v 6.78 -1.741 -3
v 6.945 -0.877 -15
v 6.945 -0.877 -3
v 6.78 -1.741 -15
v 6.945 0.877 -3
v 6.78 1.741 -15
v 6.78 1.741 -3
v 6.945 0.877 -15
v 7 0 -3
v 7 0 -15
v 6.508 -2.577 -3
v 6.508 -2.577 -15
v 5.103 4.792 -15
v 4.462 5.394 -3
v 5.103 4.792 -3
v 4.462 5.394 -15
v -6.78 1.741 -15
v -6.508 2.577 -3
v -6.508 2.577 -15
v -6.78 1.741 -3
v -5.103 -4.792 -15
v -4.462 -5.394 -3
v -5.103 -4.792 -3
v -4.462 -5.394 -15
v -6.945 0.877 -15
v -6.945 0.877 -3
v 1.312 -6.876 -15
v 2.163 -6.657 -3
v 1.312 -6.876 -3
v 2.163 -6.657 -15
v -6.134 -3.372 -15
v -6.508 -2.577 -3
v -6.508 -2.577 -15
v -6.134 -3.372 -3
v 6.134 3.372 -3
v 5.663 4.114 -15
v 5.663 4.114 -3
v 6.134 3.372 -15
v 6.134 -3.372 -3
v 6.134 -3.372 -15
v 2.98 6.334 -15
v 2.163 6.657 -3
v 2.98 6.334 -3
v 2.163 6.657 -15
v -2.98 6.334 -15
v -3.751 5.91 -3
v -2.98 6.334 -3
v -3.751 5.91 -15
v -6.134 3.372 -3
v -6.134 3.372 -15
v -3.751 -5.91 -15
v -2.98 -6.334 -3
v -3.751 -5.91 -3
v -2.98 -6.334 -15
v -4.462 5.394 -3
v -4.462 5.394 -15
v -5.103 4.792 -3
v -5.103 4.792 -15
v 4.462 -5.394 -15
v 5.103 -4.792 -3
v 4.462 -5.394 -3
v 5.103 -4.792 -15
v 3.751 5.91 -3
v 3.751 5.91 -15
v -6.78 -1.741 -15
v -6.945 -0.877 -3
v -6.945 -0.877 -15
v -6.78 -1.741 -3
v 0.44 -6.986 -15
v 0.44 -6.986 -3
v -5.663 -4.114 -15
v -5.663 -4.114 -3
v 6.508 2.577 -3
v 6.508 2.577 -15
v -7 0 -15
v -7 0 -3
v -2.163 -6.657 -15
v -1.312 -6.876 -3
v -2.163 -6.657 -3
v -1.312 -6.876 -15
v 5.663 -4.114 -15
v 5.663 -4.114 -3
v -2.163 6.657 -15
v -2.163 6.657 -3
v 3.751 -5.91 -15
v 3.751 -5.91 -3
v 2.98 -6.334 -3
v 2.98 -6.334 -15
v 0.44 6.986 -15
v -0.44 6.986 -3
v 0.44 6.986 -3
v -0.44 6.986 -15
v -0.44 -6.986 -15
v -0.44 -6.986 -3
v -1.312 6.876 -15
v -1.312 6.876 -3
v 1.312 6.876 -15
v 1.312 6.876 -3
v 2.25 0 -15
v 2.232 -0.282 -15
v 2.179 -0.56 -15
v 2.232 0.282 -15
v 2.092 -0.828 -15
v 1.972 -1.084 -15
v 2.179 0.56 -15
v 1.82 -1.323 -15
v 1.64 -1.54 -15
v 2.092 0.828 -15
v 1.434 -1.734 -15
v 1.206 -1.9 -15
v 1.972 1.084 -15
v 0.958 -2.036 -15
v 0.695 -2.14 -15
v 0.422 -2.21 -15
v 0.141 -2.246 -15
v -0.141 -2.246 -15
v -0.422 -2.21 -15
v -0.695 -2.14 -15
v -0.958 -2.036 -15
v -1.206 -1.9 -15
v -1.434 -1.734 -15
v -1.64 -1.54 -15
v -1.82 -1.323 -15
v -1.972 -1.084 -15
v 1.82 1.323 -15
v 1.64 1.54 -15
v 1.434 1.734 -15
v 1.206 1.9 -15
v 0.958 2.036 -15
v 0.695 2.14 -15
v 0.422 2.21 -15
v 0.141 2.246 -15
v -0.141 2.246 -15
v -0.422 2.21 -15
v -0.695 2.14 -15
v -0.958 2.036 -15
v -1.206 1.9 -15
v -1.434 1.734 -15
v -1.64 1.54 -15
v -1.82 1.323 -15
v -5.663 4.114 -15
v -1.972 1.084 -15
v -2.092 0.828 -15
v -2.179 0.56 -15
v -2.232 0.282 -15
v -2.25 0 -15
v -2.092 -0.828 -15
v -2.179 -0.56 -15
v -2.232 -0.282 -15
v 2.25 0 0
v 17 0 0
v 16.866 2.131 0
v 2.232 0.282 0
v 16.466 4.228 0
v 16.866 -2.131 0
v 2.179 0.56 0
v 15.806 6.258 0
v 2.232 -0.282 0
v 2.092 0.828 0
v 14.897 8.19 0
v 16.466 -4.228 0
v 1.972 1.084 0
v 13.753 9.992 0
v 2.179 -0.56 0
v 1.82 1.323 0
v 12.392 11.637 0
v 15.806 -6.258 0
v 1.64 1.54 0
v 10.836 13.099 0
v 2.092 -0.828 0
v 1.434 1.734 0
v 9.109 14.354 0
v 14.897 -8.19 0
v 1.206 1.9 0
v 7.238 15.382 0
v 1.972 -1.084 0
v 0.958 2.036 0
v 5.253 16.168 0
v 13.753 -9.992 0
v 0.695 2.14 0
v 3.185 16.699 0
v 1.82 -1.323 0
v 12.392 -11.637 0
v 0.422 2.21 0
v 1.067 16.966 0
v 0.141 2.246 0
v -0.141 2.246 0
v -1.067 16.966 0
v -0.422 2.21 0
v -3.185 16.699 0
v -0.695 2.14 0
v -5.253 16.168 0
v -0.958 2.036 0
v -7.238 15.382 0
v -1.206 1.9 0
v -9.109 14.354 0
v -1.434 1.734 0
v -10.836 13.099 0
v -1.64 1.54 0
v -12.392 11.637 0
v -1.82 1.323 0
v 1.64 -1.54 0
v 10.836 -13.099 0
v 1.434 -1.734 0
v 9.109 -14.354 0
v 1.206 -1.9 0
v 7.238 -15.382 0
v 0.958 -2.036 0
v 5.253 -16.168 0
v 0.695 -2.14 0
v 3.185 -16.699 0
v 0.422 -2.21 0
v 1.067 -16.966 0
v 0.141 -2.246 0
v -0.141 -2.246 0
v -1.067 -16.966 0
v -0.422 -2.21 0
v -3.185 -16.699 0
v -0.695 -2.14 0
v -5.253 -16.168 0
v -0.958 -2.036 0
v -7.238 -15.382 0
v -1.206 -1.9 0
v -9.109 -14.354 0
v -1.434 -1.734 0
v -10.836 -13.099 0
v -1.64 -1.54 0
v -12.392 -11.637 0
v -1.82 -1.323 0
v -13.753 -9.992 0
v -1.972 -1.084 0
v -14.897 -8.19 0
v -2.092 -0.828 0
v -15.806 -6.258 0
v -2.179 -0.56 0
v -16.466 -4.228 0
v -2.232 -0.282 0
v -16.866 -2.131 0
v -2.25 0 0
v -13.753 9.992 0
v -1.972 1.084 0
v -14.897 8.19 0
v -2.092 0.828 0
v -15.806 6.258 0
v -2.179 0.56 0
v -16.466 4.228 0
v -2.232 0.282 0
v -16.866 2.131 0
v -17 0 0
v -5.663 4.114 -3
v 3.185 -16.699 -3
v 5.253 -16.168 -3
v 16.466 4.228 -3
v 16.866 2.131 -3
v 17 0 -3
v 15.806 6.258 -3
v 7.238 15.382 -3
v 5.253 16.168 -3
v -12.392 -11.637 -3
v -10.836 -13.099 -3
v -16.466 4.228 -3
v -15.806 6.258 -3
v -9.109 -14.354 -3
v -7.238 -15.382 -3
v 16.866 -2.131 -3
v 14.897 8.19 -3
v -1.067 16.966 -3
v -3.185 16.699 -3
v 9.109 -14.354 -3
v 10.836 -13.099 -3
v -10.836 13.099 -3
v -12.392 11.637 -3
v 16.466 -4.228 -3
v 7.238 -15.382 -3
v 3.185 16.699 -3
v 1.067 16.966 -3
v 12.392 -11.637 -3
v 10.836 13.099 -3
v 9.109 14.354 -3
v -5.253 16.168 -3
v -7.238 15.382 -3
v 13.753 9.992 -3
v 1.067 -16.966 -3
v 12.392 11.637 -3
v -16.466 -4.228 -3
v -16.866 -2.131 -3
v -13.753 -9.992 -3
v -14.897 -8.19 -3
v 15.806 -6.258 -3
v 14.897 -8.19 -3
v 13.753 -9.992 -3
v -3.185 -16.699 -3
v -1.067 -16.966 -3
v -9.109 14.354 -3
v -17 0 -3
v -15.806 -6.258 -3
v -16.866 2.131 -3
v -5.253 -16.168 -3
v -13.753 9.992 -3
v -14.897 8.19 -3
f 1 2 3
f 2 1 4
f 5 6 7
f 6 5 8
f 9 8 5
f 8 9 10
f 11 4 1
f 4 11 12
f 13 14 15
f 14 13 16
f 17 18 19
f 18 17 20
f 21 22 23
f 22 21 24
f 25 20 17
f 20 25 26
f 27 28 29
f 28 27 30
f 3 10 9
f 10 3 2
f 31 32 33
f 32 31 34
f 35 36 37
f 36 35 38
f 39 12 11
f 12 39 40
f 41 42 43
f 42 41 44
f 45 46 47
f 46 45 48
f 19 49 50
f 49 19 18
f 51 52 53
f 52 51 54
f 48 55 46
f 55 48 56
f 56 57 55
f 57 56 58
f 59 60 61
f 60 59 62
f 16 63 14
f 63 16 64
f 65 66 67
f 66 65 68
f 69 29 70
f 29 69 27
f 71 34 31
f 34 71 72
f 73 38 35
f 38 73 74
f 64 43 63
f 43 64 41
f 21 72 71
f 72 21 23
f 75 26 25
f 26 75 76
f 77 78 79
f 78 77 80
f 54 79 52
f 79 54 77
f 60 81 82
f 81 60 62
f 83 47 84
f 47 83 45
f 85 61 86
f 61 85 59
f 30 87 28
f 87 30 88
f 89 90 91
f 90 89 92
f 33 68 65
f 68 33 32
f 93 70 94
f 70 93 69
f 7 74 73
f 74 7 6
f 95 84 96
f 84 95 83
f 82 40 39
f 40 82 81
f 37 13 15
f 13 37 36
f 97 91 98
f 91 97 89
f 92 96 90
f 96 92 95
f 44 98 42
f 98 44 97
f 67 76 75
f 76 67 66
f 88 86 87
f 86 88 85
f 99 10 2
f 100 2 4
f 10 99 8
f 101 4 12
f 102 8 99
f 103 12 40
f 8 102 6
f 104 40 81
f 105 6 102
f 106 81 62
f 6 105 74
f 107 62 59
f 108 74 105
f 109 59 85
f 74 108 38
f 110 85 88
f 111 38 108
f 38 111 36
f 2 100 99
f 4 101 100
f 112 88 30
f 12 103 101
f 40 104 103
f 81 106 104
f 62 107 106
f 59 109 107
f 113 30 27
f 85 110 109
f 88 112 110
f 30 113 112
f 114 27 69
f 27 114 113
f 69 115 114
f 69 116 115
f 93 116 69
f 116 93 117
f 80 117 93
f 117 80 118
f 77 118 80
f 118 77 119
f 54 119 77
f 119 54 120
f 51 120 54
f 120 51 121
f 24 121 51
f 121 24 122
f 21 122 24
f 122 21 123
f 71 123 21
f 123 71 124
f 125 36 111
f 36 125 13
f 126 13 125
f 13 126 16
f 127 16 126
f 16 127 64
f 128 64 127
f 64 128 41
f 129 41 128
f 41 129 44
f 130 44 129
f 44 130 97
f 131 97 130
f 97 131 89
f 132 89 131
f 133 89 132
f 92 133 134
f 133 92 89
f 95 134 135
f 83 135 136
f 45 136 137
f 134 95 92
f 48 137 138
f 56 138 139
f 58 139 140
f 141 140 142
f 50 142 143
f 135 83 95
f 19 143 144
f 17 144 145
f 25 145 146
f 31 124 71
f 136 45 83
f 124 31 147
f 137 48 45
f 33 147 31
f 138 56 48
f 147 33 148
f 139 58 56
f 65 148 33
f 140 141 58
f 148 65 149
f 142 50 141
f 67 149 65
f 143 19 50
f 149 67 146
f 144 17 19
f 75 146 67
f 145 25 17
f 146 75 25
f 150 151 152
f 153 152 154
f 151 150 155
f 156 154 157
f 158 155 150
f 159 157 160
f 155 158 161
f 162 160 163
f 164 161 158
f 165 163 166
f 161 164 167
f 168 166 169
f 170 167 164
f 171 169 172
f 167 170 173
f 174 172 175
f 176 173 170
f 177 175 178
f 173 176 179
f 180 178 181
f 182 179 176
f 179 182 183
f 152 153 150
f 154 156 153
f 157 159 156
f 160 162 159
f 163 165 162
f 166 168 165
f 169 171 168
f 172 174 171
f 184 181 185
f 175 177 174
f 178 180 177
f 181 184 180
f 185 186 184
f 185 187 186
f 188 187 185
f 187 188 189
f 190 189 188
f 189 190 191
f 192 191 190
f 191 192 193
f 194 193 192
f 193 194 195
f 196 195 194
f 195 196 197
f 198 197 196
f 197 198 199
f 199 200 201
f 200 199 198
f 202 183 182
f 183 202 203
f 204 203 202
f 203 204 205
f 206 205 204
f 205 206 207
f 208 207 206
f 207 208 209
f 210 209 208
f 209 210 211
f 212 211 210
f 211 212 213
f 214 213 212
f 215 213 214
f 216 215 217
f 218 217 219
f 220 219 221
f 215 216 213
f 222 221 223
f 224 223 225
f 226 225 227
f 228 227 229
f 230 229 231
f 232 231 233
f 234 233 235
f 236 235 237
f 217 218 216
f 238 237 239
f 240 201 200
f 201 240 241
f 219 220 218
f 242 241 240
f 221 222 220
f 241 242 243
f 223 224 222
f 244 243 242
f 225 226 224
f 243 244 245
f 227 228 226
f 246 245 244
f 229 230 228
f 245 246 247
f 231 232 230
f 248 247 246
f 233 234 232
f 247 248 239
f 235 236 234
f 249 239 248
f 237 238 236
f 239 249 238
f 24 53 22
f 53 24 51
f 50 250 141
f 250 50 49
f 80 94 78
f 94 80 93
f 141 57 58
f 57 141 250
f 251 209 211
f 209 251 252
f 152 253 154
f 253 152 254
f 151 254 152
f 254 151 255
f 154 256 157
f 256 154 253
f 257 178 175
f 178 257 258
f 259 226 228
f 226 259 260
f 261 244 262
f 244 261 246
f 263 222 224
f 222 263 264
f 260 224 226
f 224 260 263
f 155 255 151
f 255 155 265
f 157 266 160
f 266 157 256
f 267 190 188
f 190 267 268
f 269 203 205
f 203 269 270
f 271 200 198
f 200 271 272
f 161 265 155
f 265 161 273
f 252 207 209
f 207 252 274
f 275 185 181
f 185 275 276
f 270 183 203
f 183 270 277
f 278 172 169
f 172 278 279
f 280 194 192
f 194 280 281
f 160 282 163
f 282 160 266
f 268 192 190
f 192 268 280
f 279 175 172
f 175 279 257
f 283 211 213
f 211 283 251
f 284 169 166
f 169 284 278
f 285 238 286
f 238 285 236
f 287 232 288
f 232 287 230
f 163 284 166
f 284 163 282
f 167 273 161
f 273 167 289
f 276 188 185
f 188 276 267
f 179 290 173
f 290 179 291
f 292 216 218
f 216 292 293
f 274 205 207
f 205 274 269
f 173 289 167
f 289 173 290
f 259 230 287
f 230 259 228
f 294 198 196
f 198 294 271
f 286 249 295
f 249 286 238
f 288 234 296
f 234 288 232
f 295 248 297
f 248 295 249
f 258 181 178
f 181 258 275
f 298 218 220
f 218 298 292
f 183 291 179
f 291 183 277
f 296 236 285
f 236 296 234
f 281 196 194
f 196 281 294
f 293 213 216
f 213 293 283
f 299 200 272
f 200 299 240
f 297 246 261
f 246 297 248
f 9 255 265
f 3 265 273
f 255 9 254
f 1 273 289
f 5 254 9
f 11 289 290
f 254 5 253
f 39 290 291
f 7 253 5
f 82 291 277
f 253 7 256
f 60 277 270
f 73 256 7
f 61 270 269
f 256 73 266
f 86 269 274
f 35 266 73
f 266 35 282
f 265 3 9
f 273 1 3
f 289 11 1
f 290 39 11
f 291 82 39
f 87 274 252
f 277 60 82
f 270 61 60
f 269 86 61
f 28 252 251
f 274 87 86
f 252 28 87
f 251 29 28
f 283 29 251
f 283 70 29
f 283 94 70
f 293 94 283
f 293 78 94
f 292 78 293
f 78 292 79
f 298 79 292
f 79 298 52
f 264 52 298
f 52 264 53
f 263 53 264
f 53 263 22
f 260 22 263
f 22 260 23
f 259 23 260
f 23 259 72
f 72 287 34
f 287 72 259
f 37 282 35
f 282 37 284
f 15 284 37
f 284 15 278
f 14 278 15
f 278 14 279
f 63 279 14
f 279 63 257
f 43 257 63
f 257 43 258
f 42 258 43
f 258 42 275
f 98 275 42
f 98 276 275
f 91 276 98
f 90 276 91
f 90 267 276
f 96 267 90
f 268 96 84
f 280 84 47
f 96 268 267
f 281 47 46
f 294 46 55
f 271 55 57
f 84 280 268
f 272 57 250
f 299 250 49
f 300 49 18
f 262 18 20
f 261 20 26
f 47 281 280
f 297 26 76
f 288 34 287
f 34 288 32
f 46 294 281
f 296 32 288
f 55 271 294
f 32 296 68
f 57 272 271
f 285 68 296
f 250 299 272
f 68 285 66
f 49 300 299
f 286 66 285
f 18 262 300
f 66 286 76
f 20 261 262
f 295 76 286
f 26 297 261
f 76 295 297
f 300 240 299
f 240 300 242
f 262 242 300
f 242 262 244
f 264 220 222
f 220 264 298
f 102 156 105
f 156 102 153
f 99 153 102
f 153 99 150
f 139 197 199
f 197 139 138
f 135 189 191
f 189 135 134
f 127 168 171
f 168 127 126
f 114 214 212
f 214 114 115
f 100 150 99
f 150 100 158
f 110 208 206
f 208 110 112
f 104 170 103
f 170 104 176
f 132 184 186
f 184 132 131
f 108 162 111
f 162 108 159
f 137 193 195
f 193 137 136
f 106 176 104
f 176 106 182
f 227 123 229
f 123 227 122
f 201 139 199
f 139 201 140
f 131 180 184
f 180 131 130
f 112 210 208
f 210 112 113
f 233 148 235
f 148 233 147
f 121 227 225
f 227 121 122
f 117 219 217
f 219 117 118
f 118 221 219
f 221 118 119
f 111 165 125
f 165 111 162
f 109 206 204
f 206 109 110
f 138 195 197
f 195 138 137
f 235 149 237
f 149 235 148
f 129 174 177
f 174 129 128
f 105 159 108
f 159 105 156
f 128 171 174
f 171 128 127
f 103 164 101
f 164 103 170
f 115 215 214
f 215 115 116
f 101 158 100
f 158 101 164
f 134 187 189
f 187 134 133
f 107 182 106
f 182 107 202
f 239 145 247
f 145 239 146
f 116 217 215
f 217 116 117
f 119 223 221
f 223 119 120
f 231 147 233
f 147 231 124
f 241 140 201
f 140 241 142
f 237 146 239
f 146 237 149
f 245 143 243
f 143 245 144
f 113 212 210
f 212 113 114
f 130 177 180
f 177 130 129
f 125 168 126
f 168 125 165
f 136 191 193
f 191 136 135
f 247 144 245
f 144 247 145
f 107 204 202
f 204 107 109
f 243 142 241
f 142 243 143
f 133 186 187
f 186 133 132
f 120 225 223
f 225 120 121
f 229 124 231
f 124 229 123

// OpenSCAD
$fn = 50;


difference() {
	union() {
		translate(v = [0, 0, -15.0000000000]) {
			cylinder(h = 15, r = 7.0000000000);
		}
		translate(v = [0, 0, -3.0000000000]) {
			cylinder(h = 3, r = 17.0000000000);
		}
	}
	union() {
		#translate(v = [0, 0, -15]) {
			cylinder(h = 15, r = 2.2500000000);
		}
	}
}
